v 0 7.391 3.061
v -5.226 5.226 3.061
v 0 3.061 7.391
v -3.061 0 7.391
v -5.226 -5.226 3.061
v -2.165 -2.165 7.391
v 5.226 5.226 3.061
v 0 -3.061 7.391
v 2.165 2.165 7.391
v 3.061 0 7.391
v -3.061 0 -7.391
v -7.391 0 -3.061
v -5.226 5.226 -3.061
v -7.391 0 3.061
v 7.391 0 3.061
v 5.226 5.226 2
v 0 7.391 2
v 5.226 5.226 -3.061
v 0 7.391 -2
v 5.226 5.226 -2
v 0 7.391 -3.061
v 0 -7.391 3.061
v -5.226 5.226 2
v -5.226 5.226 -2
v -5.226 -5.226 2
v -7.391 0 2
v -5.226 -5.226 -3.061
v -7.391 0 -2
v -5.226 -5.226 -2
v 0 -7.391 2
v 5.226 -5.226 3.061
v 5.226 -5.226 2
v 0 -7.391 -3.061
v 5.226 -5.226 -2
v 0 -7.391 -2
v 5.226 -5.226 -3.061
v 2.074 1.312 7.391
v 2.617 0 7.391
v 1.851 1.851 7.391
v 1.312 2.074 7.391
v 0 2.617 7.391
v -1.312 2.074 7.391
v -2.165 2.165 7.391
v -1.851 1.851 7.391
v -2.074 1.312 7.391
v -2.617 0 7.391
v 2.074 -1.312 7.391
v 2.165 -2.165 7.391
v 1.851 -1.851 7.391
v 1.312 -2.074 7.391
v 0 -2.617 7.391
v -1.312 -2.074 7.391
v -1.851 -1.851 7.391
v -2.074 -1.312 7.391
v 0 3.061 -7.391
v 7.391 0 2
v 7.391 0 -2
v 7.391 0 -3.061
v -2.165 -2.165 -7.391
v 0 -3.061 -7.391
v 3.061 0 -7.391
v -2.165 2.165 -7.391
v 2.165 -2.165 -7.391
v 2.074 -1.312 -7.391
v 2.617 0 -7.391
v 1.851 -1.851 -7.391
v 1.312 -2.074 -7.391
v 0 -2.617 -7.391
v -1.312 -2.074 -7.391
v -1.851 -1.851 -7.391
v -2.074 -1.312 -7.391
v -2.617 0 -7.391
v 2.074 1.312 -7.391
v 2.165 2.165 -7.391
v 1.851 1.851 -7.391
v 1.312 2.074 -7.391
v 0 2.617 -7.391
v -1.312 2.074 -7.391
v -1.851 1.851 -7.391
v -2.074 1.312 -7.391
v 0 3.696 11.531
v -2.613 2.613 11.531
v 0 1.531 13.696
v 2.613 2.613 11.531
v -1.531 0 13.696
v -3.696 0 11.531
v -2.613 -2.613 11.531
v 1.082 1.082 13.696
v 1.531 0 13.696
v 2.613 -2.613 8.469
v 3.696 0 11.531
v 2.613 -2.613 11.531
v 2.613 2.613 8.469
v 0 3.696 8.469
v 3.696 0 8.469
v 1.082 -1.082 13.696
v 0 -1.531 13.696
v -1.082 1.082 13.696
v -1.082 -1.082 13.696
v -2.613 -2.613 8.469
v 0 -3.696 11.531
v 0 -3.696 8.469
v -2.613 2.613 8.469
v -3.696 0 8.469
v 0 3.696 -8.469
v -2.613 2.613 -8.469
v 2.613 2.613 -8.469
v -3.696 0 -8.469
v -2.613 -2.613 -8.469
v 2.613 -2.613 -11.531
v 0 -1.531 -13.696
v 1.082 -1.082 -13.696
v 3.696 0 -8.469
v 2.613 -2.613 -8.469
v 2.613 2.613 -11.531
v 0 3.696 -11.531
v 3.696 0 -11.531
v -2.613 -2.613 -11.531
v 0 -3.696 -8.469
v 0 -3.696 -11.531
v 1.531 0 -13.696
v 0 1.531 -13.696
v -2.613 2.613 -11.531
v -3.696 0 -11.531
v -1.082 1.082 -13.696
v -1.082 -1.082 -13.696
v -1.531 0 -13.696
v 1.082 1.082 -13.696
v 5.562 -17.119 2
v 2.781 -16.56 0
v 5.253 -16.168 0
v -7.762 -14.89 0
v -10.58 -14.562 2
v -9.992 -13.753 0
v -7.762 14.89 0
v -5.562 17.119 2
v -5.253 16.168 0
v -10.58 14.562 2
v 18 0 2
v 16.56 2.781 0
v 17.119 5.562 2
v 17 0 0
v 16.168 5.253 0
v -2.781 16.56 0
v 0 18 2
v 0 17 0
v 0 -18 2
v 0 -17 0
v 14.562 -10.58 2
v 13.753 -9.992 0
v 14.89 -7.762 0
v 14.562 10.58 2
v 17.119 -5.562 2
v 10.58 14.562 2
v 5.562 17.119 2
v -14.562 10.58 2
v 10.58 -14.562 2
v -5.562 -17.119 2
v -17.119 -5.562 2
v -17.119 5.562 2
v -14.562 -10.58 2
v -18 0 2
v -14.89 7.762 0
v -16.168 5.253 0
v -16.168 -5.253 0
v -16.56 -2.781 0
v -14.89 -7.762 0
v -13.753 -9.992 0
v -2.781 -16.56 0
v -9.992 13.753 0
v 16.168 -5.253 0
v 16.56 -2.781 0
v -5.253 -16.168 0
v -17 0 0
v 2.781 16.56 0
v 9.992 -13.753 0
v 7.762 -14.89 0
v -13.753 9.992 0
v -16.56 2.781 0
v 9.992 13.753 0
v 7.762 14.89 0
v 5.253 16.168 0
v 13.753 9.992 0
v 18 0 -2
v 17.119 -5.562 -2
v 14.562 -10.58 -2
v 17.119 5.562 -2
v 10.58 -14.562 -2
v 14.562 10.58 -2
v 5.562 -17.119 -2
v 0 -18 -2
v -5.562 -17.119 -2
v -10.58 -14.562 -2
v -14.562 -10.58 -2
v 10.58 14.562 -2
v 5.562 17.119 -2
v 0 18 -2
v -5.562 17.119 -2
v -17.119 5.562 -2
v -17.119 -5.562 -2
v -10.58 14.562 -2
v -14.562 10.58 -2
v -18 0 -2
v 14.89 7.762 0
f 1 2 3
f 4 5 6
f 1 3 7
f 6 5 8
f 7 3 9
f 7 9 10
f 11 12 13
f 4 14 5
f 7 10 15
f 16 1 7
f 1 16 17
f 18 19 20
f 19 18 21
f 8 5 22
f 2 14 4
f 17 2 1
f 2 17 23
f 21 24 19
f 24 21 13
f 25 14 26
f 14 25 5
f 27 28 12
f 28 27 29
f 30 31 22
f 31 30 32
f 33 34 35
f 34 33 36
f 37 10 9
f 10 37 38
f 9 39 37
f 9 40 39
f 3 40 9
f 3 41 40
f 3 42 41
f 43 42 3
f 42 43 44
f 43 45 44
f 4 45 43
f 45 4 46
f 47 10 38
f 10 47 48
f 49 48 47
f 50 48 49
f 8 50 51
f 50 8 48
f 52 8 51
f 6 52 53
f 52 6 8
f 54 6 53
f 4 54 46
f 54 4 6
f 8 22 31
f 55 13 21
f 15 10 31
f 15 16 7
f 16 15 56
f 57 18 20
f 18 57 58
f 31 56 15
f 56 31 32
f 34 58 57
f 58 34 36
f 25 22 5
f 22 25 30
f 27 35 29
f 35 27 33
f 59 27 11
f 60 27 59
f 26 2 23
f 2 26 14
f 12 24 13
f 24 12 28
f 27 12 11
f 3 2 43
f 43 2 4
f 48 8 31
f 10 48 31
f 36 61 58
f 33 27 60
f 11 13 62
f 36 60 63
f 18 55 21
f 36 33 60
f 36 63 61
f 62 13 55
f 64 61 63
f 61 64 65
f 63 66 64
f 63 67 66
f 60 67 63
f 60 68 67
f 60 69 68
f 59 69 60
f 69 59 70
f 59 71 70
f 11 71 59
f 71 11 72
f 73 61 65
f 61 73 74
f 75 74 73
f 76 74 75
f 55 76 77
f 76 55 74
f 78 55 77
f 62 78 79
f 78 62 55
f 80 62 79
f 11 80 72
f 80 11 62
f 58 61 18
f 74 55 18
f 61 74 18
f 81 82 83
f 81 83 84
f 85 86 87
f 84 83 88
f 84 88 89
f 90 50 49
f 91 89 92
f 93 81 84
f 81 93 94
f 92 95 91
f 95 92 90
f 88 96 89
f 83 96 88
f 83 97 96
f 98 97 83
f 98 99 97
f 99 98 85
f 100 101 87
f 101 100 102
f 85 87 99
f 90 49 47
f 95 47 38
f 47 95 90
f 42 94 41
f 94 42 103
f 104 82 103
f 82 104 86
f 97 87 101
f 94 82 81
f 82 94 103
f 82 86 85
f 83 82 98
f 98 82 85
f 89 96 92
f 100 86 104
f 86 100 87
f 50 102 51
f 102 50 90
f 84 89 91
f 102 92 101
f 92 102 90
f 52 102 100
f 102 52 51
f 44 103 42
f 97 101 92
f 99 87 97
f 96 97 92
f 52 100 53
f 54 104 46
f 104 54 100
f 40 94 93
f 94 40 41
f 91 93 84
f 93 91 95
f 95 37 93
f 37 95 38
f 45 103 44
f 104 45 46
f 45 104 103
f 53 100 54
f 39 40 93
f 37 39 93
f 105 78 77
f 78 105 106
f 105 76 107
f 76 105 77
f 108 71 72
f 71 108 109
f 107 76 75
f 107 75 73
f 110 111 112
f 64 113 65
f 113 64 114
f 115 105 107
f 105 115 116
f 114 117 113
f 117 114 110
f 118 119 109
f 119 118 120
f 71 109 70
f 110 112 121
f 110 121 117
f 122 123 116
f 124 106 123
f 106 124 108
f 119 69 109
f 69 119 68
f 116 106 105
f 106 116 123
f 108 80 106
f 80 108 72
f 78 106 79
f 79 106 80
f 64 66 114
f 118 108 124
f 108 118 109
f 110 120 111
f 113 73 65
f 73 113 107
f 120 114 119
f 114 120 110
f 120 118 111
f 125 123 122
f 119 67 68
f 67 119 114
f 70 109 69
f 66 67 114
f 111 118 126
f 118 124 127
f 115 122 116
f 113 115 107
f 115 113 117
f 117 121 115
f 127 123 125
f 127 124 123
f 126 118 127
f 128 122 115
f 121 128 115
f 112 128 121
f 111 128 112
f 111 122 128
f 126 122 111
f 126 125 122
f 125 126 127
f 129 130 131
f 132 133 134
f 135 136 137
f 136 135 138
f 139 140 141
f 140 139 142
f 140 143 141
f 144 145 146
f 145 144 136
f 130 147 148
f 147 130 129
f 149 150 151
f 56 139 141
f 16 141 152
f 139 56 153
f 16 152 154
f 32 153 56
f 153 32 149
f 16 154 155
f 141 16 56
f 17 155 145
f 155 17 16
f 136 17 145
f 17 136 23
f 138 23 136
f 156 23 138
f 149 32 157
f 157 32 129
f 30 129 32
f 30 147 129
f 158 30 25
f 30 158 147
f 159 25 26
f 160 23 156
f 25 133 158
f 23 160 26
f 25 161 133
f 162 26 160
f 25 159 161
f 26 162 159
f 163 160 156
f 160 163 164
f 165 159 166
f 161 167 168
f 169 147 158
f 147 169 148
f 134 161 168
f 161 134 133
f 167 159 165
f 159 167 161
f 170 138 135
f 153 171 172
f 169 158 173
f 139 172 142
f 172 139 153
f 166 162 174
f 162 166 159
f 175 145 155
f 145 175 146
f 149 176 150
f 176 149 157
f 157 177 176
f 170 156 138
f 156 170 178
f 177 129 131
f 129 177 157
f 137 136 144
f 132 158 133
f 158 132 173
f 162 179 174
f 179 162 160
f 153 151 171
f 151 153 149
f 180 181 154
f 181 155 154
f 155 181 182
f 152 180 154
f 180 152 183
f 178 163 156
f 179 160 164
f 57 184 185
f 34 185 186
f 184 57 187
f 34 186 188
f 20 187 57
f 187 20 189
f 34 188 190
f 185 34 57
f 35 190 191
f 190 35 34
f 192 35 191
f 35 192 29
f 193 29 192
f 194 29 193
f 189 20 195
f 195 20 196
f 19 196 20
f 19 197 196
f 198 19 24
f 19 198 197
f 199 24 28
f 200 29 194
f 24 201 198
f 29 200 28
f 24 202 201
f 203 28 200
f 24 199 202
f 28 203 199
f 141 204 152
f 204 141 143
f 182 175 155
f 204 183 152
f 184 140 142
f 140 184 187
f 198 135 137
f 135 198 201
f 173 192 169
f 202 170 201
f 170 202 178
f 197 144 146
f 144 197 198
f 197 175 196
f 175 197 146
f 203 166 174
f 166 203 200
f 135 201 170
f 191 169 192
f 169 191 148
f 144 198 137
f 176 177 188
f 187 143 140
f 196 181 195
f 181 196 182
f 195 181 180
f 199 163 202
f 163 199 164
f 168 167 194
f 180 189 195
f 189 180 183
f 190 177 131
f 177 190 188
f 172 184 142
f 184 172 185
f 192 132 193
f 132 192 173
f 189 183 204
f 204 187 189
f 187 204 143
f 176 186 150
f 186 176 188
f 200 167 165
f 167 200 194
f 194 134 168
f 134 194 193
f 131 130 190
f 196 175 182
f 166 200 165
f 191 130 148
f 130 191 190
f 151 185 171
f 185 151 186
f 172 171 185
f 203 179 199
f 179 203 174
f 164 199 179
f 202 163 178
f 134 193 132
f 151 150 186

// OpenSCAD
sphere(8, $fn=8);
color([0,0.3,1])
translate([0,0,10])
sphere(4, $fn=8); 
color([0,0.3,1])
translate([0,0,-10])
sphere(4, $fn=8); 

//цилиндр
color([0,0.3,1])
//translate([25,0,20])
cylinder(h=4, r1=16, r2=18, $fn=20,center=true);

//цилиндр
color([0,0.3,1])
//translate([25,0,20])
cylinder(h=4, r1=18, r2=16, $fn=20, center=true);
